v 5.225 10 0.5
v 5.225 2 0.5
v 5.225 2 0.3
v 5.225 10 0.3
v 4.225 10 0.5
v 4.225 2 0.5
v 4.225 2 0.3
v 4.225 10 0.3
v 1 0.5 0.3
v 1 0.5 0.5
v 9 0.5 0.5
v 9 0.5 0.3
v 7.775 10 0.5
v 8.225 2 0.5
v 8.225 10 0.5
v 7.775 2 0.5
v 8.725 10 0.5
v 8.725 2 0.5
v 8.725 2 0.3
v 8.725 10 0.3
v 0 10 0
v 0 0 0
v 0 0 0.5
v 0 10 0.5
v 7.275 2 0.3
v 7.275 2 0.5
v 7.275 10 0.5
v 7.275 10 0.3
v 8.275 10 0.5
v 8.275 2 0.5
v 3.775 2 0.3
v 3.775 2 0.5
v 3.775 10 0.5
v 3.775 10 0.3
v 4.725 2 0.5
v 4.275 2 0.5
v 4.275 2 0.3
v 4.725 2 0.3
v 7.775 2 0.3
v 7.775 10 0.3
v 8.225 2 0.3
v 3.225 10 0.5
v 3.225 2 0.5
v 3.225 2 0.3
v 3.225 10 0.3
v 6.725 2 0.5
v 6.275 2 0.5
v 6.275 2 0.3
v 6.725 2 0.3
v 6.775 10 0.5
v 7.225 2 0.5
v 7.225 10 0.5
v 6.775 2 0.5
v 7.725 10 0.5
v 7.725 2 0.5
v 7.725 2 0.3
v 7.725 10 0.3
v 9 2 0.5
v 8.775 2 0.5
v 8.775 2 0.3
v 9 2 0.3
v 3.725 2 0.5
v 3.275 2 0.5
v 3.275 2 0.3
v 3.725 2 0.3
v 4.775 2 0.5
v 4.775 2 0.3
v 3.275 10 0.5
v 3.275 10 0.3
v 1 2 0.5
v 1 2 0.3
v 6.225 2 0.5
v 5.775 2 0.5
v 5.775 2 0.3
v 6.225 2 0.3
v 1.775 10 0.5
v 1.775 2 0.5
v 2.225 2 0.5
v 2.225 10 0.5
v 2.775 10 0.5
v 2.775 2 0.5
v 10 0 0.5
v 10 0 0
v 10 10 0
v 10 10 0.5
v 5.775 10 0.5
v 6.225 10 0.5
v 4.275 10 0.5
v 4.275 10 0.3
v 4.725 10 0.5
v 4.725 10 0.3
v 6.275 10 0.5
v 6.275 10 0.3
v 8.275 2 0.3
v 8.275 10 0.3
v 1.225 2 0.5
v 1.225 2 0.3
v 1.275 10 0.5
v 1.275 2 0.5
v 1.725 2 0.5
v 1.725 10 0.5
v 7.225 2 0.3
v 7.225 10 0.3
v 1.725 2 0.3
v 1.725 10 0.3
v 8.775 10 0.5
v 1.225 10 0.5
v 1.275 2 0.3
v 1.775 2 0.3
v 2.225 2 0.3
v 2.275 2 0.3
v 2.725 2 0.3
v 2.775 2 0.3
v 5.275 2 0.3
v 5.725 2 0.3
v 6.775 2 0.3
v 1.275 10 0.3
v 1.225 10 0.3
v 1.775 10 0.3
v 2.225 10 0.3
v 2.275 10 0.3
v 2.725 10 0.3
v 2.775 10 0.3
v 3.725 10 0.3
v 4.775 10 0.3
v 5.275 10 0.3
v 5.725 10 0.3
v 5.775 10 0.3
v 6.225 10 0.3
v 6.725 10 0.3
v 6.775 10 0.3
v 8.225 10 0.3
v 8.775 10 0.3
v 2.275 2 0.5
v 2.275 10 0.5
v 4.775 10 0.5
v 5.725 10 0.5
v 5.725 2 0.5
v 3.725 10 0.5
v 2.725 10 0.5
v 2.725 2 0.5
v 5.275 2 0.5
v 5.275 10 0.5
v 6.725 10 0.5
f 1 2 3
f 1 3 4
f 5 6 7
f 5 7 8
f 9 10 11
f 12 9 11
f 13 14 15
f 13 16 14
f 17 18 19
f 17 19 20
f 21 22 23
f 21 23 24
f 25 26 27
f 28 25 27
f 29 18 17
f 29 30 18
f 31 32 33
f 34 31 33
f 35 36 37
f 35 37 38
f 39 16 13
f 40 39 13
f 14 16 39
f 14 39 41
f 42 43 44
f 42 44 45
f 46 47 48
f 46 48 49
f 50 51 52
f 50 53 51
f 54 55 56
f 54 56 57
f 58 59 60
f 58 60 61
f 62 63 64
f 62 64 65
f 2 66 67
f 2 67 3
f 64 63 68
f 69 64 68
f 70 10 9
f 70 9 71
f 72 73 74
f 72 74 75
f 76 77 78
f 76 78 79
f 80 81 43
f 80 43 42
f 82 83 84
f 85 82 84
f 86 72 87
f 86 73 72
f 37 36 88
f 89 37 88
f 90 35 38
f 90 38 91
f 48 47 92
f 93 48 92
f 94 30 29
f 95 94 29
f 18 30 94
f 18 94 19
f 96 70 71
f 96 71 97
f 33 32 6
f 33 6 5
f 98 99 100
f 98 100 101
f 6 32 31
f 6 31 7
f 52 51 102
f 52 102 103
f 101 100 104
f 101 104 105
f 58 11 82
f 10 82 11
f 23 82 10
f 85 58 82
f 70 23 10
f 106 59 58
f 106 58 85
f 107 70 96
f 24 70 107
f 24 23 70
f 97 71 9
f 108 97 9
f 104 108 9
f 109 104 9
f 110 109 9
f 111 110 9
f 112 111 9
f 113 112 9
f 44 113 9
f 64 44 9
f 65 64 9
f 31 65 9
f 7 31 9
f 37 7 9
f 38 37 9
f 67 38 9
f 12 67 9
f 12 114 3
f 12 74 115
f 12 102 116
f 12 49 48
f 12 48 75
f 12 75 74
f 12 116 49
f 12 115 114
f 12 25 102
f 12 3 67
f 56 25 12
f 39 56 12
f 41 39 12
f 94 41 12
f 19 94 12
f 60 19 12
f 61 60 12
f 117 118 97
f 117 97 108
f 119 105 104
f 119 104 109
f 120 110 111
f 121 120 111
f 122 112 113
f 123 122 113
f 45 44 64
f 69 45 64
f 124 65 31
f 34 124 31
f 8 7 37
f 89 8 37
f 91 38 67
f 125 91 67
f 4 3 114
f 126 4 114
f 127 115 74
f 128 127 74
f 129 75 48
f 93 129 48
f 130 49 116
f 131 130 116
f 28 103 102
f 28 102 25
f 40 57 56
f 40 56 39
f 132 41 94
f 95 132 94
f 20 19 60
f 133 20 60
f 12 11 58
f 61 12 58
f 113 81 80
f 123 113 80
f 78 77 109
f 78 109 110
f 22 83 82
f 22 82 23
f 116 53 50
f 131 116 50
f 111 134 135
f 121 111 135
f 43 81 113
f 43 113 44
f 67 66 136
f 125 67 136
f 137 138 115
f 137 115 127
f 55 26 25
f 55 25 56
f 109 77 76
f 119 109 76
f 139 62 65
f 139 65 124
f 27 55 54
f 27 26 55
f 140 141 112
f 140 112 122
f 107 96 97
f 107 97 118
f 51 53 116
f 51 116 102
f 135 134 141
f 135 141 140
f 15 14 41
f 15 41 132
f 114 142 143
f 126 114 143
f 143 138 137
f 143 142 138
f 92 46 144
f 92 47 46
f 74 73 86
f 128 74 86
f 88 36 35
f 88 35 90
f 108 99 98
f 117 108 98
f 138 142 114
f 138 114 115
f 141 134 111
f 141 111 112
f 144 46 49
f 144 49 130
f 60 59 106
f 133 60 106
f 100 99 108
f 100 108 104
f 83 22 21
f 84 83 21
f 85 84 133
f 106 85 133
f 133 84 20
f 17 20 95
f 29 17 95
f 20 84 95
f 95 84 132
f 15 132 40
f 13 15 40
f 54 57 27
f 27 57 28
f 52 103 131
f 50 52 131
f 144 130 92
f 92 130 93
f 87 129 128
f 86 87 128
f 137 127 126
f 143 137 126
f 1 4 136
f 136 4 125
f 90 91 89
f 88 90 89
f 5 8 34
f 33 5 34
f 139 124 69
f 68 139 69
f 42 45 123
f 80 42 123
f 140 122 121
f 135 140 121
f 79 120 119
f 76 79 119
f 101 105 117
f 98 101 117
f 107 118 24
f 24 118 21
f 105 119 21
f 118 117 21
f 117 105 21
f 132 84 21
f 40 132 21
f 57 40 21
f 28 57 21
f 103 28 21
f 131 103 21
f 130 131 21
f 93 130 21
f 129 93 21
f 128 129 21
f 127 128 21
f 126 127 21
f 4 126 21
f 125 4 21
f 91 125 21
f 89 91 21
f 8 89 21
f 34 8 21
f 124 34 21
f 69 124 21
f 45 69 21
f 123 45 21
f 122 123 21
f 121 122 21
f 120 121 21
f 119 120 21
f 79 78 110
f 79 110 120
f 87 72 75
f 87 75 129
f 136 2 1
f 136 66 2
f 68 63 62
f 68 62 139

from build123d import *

# Parameters (mm, degrees)
SKETCH1_W           = 10
SKETCH1_H           = 10
BOSS_EXTRUDE1_DEPTH = 0.5
SKETCH2_W           = 8
SKETCH2_H           = 1.5
CUT_EXTRUDE1_DEPTH  = 0.2
SKETCH3_W           = 0.05
SKETCH3_H           = 8
CUT_EXTRUDE2_DEPTH  = 0.2


with BuildPart() as part:
    # Sketch1 → Boss-Extrude1 (new body)
    with BuildSketch(Plane(origin=(0, 0, 0), x_dir=(0, 1, 0), z_dir=(0, 0, 1))):
        with Locations((5, -5)):
            Rectangle(SKETCH1_W, SKETCH1_H)
    extrude(amount=BOSS_EXTRUDE1_DEPTH)

    # Sketch2 → Cut-Extrude1 (cut)
    with BuildSketch(Plane.XY.offset(0.5)):
        with Locations((5, 1.25)):
            Rectangle(SKETCH2_W, SKETCH2_H)
    extrude(amount=-CUT_EXTRUDE1_DEPTH, mode=Mode.SUBTRACT)

    # Sketch3 → Cut-Extrude2 (cut)
    with BuildSketch(Plane.XY.offset(0.5)):
        with Locations((1.25, 6)):
            Rectangle(SKETCH3_W, SKETCH3_H)
        with Locations((1.75, 6)):
            Rectangle(SKETCH3_W, SKETCH3_H)
        with Locations((2.25, 6)):
            Rectangle(SKETCH3_W, SKETCH3_H)
        with Locations((2.75, 6)):
            Rectangle(SKETCH3_W, SKETCH3_H)
        with Locations((3.25, 6)):
            Rectangle(SKETCH3_W, SKETCH3_H)
        with Locations((3.75, 6)):
            Rectangle(SKETCH3_W, SKETCH3_H)
        with Locations((4.25, 6)):
            Rectangle(SKETCH3_W, SKETCH3_H)
        with Locations((4.75, 6)):
            Rectangle(SKETCH3_W, SKETCH3_H)
        with Locations((5.25, 6)):
            Rectangle(SKETCH3_W, SKETCH3_H)
        with Locations((5.75, 6)):
            Rectangle(SKETCH3_W, SKETCH3_H)
        with Locations((6.25, 6)):
            Rectangle(SKETCH3_W, SKETCH3_H)
        with Locations((6.75, 6)):
            Rectangle(SKETCH3_W, SKETCH3_H)
        with Locations((7.25, 6)):
            Rectangle(SKETCH3_W, SKETCH3_H)
        with Locations((7.75, 6)):
            Rectangle(SKETCH3_W, SKETCH3_H)
        with Locations((8.25, 6)):
            Rectangle(SKETCH3_W, SKETCH3_H)
        with Locations((8.75, 6)):
            Rectangle(SKETCH3_W, SKETCH3_H)
    extrude(amount=-CUT_EXTRUDE2_DEPTH, mode=Mode.SUBTRACT)


solid = part.part
